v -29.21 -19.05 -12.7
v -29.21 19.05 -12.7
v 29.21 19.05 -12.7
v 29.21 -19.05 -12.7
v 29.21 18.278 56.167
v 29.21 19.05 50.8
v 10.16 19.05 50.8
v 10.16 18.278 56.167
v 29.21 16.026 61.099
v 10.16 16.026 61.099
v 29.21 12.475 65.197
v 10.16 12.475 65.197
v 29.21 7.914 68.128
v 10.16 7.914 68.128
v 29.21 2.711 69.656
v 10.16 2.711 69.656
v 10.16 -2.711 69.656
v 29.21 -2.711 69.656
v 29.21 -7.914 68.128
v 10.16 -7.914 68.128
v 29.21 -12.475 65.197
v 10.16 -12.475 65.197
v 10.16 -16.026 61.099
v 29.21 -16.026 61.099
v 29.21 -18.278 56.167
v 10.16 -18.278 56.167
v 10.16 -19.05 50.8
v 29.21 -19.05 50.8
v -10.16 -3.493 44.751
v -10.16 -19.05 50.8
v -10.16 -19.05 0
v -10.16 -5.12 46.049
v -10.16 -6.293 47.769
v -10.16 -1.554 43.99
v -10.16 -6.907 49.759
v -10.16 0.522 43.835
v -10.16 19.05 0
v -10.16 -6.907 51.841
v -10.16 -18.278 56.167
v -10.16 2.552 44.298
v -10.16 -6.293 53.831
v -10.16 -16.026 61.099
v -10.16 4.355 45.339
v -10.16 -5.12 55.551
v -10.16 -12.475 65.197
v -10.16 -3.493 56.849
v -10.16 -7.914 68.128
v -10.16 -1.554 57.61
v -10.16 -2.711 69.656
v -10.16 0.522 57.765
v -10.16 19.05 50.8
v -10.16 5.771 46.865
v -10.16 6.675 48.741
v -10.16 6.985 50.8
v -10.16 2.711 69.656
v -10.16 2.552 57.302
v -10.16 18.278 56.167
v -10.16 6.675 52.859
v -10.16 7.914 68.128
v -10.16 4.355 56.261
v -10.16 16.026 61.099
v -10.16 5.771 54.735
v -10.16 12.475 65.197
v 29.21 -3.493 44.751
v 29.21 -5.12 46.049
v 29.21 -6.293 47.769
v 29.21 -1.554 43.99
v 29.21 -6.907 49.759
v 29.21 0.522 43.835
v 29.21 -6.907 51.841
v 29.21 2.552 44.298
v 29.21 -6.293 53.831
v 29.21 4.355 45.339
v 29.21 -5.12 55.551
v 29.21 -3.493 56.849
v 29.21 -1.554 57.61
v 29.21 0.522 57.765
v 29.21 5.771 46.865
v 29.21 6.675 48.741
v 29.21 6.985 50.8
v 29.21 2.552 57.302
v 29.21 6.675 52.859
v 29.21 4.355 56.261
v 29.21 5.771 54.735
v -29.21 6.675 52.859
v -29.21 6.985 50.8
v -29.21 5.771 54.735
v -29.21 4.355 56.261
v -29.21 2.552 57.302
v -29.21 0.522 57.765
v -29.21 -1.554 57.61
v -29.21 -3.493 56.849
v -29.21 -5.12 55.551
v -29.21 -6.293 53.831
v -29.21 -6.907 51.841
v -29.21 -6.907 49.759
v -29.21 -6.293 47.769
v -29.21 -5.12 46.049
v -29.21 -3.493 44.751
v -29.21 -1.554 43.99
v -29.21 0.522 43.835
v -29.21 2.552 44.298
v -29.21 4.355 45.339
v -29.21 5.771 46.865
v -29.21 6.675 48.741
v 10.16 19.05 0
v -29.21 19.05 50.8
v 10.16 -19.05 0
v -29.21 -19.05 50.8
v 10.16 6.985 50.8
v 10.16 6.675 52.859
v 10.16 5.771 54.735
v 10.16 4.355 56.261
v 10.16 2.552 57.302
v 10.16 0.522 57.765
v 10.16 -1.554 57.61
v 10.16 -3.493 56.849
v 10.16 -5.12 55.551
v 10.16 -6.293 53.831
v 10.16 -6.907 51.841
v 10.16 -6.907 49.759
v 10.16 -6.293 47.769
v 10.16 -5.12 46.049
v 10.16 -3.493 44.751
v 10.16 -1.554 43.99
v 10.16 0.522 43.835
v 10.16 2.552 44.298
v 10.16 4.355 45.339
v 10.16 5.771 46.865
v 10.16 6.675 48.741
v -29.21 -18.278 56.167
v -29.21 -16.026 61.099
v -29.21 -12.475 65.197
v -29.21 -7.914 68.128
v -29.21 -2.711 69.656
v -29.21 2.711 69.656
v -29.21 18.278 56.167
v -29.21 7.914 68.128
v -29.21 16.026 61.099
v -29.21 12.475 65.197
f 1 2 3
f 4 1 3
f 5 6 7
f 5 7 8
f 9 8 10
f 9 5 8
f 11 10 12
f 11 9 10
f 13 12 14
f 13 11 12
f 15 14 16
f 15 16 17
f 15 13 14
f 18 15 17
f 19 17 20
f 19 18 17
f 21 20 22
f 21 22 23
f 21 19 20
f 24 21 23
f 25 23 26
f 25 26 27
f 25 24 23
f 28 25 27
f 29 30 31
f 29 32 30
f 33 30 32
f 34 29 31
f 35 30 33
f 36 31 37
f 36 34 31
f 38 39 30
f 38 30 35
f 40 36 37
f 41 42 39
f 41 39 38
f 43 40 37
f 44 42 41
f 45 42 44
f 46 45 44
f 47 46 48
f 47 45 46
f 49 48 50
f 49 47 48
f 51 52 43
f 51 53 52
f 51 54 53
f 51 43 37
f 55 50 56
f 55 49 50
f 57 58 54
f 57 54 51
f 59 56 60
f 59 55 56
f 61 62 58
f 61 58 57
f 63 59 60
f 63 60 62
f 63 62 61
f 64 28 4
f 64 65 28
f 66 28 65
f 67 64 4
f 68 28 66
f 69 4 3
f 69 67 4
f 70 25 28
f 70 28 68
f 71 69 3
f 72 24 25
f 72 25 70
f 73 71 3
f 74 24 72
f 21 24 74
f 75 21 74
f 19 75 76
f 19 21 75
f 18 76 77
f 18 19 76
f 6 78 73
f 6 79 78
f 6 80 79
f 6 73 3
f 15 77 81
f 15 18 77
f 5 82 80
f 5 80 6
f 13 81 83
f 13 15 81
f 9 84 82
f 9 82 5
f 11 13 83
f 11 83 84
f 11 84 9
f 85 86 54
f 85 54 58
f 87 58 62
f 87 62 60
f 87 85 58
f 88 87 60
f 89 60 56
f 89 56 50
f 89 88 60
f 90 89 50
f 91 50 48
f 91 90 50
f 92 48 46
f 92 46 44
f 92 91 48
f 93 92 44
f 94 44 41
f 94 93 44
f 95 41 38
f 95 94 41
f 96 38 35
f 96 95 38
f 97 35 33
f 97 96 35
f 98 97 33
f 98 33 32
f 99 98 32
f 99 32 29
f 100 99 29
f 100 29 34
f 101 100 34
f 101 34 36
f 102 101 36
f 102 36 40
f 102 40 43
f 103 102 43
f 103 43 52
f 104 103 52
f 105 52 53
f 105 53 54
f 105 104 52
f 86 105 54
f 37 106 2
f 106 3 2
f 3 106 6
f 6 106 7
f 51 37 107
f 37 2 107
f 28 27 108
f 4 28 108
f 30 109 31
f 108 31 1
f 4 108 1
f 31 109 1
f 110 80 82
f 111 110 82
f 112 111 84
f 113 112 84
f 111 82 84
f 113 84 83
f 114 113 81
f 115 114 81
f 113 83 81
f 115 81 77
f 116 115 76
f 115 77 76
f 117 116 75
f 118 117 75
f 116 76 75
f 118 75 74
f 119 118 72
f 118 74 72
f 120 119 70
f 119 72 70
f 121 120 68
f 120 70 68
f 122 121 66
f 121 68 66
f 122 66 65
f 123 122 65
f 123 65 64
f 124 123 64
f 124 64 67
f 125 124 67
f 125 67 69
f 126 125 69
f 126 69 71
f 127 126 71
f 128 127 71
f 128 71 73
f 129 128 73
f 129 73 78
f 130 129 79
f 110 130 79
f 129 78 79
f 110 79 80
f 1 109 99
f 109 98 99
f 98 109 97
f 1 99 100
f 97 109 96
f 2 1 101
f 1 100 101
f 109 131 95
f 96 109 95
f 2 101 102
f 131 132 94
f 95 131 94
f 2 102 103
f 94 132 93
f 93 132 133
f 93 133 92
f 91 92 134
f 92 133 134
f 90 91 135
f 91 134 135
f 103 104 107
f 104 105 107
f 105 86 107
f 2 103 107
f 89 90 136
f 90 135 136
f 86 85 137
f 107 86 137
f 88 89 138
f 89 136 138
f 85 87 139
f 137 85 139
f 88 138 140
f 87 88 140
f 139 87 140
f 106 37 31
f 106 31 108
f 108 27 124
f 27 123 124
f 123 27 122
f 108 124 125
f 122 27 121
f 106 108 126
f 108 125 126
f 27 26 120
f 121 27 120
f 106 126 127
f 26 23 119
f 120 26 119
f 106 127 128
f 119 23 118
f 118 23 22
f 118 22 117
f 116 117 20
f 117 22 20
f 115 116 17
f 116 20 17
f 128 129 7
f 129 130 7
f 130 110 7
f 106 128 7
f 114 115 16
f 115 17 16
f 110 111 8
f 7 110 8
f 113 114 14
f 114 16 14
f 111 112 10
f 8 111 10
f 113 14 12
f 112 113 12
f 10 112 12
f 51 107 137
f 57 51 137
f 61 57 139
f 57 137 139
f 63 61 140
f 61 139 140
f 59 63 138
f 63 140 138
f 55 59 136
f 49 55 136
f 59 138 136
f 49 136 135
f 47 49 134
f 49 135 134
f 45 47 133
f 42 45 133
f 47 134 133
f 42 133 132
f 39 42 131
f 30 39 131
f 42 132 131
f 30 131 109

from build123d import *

# Parameters (mm, degrees)
F0_W     = 58.42
F0_H     = 38.1
F1_DEPTH = 12.7
F2_R     = 6.985
F3_DEPTH = 19.05


with BuildPart() as f1:
    # F0 (on Top) → F1 (new body)
    with BuildSketch(Plane.XY):
        Rectangle(F0_W, F0_H)
    extrude(amount=-F1_DEPTH)

    # F2 (on face) → F3 (join)
    with BuildSketch(Plane.YZ.offset(29.21)):
        with BuildLine():
            Line((-19.05, 0), (19.05, 0))
            Line((19.05, 0), (19.05, 50.8))
            ThreePointArc((19.05, 50.8), (0, 69.85), (-19.05, 50.8))
            Line((-19.05, 50.8), (-19.05, 0))
        make_face()
        with Locations((0, 50.8)):
            Circle(F2_R, mode=Mode.SUBTRACT)
    extrude(amount=-F3_DEPTH)

    # F4: F1 across plane


with BuildPart() as f1_1:
    add(f1.part)
    add(f1.part.mirror(Plane.YZ))


solid = f1_1.part
